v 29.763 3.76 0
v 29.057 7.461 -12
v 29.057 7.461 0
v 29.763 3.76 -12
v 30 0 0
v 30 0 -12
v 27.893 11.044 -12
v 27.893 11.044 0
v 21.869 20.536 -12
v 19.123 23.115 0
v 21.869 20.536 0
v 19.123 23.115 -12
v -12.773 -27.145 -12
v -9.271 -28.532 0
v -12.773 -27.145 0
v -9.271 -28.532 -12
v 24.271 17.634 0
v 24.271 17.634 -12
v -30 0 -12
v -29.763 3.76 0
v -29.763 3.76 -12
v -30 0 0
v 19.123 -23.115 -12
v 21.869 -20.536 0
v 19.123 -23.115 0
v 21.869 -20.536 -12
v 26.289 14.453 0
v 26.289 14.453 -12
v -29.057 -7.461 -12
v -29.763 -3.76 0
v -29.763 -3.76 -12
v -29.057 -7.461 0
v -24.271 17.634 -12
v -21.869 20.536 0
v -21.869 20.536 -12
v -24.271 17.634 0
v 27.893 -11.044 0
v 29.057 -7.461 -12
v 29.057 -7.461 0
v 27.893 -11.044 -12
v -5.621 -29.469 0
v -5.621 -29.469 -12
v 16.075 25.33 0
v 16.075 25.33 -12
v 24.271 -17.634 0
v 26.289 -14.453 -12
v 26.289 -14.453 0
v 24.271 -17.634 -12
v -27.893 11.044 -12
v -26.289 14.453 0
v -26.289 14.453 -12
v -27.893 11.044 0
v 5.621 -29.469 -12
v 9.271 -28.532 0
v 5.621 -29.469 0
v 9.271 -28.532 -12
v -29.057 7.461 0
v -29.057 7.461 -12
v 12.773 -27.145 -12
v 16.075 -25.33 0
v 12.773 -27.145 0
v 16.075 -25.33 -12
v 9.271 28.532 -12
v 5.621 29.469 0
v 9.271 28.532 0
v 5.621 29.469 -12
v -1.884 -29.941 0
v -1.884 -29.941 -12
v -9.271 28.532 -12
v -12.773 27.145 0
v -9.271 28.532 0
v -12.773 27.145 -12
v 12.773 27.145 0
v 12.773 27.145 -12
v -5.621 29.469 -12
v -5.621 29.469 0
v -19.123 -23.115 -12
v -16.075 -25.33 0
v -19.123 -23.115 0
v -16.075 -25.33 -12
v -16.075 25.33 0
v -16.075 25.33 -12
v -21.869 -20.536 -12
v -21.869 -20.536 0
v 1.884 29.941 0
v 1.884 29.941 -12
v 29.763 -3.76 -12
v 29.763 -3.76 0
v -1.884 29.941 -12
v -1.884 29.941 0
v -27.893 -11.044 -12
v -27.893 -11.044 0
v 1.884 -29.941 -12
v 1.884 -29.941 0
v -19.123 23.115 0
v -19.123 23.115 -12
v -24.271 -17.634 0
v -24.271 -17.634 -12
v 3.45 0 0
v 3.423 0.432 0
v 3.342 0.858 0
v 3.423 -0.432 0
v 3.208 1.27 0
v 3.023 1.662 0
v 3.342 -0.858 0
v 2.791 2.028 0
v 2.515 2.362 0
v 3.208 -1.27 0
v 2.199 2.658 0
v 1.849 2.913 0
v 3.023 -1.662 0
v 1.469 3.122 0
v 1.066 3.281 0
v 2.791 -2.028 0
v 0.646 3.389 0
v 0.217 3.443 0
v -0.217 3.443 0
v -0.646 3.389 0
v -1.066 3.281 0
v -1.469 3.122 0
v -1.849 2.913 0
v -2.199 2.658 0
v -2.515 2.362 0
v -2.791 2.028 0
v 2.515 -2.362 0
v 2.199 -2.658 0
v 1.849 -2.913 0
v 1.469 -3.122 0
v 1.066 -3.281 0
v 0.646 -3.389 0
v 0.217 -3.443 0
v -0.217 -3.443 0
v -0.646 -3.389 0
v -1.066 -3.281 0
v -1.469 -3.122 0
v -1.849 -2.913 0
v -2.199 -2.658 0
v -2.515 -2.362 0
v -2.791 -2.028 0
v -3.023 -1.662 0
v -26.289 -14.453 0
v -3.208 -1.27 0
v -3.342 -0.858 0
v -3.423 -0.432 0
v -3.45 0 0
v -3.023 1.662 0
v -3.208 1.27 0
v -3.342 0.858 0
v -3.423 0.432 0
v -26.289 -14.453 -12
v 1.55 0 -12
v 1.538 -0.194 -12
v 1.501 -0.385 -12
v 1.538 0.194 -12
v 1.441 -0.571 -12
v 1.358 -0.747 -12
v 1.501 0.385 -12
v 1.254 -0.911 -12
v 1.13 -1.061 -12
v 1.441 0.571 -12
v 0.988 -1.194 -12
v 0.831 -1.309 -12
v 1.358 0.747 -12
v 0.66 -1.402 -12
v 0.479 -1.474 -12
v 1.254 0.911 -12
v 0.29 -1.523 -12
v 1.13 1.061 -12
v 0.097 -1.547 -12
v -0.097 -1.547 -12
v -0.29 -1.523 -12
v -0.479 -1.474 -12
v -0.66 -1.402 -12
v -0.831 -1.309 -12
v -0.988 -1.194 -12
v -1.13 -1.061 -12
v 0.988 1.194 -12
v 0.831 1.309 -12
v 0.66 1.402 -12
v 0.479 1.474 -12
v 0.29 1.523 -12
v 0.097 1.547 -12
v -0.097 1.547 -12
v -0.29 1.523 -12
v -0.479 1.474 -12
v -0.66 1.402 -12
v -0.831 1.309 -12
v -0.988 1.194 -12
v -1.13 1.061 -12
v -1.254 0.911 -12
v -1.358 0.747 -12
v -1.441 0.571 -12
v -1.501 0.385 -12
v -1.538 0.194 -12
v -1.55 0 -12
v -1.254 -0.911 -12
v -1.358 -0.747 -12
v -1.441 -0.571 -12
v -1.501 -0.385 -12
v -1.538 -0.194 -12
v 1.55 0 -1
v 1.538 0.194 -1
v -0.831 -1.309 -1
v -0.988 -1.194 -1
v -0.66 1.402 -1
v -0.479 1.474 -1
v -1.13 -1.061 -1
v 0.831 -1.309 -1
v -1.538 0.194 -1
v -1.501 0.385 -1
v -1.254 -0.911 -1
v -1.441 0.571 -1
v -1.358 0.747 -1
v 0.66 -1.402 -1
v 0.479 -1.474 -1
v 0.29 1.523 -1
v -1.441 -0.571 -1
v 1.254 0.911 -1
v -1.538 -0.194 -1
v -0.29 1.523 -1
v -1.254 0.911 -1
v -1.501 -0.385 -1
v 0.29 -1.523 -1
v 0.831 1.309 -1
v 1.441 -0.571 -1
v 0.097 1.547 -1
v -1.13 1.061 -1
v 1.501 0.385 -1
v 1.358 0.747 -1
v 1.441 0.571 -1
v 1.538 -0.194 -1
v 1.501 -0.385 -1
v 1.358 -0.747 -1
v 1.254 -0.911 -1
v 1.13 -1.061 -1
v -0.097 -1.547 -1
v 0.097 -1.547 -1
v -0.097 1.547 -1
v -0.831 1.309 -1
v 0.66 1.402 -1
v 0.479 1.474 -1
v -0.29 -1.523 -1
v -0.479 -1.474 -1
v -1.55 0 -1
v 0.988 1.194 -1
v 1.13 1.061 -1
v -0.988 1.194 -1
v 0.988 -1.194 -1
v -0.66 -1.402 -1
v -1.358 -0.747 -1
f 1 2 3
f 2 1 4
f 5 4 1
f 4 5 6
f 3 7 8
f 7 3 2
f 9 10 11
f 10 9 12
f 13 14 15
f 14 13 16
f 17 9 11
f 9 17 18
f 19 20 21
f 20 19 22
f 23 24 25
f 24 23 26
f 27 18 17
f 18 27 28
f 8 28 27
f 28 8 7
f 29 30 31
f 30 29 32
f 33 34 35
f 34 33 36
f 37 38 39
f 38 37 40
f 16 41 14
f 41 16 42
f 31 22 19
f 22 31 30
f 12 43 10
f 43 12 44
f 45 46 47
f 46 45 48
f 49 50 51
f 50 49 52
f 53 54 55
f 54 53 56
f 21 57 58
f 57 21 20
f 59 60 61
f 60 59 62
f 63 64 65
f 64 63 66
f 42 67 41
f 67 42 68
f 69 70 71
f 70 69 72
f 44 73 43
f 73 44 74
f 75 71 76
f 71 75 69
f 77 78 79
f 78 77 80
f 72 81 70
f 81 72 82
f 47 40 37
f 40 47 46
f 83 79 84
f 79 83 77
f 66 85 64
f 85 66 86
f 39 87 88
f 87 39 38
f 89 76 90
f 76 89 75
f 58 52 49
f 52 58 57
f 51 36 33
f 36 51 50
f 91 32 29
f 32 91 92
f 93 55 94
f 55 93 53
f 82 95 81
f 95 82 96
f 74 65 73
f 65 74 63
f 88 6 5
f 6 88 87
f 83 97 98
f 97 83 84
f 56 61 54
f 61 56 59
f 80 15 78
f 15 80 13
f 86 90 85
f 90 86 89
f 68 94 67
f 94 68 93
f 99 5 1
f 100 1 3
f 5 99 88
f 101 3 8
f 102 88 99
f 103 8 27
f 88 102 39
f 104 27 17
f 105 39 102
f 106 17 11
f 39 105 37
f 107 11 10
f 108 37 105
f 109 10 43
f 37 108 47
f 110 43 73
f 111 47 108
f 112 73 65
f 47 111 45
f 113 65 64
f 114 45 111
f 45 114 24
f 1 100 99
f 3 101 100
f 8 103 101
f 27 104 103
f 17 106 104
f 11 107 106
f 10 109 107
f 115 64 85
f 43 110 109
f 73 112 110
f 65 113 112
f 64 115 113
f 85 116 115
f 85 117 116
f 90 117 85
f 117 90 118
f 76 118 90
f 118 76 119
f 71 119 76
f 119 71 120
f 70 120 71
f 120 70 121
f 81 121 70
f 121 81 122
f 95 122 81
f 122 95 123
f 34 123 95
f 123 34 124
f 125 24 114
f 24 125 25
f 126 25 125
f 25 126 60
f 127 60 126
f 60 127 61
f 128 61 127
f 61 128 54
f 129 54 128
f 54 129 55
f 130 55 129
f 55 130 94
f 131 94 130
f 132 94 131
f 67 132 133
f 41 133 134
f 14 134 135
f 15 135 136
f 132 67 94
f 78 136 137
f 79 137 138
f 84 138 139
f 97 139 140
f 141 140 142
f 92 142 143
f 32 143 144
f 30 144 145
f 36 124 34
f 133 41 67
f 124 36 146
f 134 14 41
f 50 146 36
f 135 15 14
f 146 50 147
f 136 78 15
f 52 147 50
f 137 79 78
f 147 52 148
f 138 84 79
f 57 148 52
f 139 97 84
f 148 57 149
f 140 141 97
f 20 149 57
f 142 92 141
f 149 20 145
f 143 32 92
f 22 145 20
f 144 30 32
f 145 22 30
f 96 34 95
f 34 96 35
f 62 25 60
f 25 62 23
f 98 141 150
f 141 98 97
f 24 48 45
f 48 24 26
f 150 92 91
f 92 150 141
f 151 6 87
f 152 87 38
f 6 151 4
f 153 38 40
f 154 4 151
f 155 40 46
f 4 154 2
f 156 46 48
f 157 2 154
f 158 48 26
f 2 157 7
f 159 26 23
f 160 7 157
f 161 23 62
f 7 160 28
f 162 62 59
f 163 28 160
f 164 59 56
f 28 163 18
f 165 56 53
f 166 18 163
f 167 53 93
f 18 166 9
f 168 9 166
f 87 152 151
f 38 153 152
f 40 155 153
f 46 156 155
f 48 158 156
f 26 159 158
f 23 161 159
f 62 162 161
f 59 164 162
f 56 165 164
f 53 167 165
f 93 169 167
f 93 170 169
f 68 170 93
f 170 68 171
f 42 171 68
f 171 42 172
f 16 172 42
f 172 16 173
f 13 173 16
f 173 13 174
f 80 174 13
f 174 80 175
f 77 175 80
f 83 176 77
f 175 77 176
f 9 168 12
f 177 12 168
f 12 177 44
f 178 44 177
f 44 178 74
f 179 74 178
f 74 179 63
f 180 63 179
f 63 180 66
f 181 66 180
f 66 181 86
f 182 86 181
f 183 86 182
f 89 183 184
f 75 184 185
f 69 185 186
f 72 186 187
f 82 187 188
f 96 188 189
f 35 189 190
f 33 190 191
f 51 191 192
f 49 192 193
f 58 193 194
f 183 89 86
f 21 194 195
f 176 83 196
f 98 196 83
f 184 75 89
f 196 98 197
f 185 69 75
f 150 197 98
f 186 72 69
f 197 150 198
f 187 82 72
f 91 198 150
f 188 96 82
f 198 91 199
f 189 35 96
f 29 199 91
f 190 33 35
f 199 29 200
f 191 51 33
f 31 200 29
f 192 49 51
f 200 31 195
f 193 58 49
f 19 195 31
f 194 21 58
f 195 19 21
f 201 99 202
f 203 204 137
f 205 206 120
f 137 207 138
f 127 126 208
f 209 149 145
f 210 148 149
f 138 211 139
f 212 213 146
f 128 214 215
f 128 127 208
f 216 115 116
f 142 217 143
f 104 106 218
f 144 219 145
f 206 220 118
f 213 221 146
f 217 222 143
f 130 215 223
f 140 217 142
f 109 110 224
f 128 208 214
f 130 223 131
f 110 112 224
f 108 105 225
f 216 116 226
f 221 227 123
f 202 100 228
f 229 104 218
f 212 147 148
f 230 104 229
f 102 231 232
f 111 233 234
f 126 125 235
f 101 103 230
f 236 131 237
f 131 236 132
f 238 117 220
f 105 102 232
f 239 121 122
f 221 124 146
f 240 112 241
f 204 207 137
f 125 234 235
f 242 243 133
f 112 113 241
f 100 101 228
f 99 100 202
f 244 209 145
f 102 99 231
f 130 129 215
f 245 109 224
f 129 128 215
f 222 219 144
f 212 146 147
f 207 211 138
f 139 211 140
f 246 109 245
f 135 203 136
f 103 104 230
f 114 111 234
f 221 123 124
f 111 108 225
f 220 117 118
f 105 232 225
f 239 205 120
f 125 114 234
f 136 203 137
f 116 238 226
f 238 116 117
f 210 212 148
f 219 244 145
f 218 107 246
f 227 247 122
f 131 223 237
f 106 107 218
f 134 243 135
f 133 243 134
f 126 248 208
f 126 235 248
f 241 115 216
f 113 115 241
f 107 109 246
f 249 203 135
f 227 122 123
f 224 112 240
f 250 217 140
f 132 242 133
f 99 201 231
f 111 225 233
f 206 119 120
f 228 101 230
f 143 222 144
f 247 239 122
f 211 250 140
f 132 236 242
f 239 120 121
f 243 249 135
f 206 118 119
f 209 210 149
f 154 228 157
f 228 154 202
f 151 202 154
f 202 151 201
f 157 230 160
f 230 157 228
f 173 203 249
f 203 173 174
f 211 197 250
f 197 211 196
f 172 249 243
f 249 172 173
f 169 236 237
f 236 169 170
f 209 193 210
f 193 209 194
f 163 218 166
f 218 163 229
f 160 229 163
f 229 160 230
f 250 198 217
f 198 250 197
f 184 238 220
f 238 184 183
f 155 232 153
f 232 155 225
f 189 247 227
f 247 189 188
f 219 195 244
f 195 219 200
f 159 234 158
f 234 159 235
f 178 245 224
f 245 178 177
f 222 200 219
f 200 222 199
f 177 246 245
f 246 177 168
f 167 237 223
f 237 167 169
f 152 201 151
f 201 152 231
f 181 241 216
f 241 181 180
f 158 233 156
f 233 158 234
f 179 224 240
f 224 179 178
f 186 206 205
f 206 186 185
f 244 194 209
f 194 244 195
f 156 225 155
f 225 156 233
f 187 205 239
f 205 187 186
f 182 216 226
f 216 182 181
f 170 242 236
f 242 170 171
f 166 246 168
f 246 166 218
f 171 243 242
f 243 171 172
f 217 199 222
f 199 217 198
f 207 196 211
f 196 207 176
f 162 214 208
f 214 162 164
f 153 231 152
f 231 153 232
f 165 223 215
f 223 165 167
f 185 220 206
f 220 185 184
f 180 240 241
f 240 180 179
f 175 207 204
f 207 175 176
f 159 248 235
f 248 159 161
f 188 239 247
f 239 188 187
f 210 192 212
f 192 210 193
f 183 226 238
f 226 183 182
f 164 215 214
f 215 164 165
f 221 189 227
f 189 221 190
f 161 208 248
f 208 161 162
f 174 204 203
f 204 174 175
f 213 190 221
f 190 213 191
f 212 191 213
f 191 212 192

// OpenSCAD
$fn = 50;


difference() {
	union() {
		translate(v = [0, 0, -12.0000000000]) {
			cylinder(h = 12, r = 30.0000000000);
		}
		translate(v = [0, 0, -12.0000000000]) {
			cylinder(h = 12, r = 2.8750000000);
		}
	}
	union() {
		translate(v = [0, 0, 0]) {
			rotate(a = [0, 0, 0]) {
				difference() {
					union() {
						translate(v = [0, 0, -12.0000000000]) {
							cylinder(h = 12, r = 1.2500000000);
						}
						translate(v = [0, 0, -1.0000000000]) {
							cylinder(h = 1.0000000000, r1 = 1.5500000000, r2 = 3.4500000000);
						}
						translate(v = [0, 0, -12.0000000000]) {
							cylinder(h = 12, r = 1.5500000000);
						}
						translate(v = [0, 0, -12.0000000000]) {
							cylinder(h = 12, r = 1.2500000000);
						}
					}
					union();
				}
			}
		}
	}
}
